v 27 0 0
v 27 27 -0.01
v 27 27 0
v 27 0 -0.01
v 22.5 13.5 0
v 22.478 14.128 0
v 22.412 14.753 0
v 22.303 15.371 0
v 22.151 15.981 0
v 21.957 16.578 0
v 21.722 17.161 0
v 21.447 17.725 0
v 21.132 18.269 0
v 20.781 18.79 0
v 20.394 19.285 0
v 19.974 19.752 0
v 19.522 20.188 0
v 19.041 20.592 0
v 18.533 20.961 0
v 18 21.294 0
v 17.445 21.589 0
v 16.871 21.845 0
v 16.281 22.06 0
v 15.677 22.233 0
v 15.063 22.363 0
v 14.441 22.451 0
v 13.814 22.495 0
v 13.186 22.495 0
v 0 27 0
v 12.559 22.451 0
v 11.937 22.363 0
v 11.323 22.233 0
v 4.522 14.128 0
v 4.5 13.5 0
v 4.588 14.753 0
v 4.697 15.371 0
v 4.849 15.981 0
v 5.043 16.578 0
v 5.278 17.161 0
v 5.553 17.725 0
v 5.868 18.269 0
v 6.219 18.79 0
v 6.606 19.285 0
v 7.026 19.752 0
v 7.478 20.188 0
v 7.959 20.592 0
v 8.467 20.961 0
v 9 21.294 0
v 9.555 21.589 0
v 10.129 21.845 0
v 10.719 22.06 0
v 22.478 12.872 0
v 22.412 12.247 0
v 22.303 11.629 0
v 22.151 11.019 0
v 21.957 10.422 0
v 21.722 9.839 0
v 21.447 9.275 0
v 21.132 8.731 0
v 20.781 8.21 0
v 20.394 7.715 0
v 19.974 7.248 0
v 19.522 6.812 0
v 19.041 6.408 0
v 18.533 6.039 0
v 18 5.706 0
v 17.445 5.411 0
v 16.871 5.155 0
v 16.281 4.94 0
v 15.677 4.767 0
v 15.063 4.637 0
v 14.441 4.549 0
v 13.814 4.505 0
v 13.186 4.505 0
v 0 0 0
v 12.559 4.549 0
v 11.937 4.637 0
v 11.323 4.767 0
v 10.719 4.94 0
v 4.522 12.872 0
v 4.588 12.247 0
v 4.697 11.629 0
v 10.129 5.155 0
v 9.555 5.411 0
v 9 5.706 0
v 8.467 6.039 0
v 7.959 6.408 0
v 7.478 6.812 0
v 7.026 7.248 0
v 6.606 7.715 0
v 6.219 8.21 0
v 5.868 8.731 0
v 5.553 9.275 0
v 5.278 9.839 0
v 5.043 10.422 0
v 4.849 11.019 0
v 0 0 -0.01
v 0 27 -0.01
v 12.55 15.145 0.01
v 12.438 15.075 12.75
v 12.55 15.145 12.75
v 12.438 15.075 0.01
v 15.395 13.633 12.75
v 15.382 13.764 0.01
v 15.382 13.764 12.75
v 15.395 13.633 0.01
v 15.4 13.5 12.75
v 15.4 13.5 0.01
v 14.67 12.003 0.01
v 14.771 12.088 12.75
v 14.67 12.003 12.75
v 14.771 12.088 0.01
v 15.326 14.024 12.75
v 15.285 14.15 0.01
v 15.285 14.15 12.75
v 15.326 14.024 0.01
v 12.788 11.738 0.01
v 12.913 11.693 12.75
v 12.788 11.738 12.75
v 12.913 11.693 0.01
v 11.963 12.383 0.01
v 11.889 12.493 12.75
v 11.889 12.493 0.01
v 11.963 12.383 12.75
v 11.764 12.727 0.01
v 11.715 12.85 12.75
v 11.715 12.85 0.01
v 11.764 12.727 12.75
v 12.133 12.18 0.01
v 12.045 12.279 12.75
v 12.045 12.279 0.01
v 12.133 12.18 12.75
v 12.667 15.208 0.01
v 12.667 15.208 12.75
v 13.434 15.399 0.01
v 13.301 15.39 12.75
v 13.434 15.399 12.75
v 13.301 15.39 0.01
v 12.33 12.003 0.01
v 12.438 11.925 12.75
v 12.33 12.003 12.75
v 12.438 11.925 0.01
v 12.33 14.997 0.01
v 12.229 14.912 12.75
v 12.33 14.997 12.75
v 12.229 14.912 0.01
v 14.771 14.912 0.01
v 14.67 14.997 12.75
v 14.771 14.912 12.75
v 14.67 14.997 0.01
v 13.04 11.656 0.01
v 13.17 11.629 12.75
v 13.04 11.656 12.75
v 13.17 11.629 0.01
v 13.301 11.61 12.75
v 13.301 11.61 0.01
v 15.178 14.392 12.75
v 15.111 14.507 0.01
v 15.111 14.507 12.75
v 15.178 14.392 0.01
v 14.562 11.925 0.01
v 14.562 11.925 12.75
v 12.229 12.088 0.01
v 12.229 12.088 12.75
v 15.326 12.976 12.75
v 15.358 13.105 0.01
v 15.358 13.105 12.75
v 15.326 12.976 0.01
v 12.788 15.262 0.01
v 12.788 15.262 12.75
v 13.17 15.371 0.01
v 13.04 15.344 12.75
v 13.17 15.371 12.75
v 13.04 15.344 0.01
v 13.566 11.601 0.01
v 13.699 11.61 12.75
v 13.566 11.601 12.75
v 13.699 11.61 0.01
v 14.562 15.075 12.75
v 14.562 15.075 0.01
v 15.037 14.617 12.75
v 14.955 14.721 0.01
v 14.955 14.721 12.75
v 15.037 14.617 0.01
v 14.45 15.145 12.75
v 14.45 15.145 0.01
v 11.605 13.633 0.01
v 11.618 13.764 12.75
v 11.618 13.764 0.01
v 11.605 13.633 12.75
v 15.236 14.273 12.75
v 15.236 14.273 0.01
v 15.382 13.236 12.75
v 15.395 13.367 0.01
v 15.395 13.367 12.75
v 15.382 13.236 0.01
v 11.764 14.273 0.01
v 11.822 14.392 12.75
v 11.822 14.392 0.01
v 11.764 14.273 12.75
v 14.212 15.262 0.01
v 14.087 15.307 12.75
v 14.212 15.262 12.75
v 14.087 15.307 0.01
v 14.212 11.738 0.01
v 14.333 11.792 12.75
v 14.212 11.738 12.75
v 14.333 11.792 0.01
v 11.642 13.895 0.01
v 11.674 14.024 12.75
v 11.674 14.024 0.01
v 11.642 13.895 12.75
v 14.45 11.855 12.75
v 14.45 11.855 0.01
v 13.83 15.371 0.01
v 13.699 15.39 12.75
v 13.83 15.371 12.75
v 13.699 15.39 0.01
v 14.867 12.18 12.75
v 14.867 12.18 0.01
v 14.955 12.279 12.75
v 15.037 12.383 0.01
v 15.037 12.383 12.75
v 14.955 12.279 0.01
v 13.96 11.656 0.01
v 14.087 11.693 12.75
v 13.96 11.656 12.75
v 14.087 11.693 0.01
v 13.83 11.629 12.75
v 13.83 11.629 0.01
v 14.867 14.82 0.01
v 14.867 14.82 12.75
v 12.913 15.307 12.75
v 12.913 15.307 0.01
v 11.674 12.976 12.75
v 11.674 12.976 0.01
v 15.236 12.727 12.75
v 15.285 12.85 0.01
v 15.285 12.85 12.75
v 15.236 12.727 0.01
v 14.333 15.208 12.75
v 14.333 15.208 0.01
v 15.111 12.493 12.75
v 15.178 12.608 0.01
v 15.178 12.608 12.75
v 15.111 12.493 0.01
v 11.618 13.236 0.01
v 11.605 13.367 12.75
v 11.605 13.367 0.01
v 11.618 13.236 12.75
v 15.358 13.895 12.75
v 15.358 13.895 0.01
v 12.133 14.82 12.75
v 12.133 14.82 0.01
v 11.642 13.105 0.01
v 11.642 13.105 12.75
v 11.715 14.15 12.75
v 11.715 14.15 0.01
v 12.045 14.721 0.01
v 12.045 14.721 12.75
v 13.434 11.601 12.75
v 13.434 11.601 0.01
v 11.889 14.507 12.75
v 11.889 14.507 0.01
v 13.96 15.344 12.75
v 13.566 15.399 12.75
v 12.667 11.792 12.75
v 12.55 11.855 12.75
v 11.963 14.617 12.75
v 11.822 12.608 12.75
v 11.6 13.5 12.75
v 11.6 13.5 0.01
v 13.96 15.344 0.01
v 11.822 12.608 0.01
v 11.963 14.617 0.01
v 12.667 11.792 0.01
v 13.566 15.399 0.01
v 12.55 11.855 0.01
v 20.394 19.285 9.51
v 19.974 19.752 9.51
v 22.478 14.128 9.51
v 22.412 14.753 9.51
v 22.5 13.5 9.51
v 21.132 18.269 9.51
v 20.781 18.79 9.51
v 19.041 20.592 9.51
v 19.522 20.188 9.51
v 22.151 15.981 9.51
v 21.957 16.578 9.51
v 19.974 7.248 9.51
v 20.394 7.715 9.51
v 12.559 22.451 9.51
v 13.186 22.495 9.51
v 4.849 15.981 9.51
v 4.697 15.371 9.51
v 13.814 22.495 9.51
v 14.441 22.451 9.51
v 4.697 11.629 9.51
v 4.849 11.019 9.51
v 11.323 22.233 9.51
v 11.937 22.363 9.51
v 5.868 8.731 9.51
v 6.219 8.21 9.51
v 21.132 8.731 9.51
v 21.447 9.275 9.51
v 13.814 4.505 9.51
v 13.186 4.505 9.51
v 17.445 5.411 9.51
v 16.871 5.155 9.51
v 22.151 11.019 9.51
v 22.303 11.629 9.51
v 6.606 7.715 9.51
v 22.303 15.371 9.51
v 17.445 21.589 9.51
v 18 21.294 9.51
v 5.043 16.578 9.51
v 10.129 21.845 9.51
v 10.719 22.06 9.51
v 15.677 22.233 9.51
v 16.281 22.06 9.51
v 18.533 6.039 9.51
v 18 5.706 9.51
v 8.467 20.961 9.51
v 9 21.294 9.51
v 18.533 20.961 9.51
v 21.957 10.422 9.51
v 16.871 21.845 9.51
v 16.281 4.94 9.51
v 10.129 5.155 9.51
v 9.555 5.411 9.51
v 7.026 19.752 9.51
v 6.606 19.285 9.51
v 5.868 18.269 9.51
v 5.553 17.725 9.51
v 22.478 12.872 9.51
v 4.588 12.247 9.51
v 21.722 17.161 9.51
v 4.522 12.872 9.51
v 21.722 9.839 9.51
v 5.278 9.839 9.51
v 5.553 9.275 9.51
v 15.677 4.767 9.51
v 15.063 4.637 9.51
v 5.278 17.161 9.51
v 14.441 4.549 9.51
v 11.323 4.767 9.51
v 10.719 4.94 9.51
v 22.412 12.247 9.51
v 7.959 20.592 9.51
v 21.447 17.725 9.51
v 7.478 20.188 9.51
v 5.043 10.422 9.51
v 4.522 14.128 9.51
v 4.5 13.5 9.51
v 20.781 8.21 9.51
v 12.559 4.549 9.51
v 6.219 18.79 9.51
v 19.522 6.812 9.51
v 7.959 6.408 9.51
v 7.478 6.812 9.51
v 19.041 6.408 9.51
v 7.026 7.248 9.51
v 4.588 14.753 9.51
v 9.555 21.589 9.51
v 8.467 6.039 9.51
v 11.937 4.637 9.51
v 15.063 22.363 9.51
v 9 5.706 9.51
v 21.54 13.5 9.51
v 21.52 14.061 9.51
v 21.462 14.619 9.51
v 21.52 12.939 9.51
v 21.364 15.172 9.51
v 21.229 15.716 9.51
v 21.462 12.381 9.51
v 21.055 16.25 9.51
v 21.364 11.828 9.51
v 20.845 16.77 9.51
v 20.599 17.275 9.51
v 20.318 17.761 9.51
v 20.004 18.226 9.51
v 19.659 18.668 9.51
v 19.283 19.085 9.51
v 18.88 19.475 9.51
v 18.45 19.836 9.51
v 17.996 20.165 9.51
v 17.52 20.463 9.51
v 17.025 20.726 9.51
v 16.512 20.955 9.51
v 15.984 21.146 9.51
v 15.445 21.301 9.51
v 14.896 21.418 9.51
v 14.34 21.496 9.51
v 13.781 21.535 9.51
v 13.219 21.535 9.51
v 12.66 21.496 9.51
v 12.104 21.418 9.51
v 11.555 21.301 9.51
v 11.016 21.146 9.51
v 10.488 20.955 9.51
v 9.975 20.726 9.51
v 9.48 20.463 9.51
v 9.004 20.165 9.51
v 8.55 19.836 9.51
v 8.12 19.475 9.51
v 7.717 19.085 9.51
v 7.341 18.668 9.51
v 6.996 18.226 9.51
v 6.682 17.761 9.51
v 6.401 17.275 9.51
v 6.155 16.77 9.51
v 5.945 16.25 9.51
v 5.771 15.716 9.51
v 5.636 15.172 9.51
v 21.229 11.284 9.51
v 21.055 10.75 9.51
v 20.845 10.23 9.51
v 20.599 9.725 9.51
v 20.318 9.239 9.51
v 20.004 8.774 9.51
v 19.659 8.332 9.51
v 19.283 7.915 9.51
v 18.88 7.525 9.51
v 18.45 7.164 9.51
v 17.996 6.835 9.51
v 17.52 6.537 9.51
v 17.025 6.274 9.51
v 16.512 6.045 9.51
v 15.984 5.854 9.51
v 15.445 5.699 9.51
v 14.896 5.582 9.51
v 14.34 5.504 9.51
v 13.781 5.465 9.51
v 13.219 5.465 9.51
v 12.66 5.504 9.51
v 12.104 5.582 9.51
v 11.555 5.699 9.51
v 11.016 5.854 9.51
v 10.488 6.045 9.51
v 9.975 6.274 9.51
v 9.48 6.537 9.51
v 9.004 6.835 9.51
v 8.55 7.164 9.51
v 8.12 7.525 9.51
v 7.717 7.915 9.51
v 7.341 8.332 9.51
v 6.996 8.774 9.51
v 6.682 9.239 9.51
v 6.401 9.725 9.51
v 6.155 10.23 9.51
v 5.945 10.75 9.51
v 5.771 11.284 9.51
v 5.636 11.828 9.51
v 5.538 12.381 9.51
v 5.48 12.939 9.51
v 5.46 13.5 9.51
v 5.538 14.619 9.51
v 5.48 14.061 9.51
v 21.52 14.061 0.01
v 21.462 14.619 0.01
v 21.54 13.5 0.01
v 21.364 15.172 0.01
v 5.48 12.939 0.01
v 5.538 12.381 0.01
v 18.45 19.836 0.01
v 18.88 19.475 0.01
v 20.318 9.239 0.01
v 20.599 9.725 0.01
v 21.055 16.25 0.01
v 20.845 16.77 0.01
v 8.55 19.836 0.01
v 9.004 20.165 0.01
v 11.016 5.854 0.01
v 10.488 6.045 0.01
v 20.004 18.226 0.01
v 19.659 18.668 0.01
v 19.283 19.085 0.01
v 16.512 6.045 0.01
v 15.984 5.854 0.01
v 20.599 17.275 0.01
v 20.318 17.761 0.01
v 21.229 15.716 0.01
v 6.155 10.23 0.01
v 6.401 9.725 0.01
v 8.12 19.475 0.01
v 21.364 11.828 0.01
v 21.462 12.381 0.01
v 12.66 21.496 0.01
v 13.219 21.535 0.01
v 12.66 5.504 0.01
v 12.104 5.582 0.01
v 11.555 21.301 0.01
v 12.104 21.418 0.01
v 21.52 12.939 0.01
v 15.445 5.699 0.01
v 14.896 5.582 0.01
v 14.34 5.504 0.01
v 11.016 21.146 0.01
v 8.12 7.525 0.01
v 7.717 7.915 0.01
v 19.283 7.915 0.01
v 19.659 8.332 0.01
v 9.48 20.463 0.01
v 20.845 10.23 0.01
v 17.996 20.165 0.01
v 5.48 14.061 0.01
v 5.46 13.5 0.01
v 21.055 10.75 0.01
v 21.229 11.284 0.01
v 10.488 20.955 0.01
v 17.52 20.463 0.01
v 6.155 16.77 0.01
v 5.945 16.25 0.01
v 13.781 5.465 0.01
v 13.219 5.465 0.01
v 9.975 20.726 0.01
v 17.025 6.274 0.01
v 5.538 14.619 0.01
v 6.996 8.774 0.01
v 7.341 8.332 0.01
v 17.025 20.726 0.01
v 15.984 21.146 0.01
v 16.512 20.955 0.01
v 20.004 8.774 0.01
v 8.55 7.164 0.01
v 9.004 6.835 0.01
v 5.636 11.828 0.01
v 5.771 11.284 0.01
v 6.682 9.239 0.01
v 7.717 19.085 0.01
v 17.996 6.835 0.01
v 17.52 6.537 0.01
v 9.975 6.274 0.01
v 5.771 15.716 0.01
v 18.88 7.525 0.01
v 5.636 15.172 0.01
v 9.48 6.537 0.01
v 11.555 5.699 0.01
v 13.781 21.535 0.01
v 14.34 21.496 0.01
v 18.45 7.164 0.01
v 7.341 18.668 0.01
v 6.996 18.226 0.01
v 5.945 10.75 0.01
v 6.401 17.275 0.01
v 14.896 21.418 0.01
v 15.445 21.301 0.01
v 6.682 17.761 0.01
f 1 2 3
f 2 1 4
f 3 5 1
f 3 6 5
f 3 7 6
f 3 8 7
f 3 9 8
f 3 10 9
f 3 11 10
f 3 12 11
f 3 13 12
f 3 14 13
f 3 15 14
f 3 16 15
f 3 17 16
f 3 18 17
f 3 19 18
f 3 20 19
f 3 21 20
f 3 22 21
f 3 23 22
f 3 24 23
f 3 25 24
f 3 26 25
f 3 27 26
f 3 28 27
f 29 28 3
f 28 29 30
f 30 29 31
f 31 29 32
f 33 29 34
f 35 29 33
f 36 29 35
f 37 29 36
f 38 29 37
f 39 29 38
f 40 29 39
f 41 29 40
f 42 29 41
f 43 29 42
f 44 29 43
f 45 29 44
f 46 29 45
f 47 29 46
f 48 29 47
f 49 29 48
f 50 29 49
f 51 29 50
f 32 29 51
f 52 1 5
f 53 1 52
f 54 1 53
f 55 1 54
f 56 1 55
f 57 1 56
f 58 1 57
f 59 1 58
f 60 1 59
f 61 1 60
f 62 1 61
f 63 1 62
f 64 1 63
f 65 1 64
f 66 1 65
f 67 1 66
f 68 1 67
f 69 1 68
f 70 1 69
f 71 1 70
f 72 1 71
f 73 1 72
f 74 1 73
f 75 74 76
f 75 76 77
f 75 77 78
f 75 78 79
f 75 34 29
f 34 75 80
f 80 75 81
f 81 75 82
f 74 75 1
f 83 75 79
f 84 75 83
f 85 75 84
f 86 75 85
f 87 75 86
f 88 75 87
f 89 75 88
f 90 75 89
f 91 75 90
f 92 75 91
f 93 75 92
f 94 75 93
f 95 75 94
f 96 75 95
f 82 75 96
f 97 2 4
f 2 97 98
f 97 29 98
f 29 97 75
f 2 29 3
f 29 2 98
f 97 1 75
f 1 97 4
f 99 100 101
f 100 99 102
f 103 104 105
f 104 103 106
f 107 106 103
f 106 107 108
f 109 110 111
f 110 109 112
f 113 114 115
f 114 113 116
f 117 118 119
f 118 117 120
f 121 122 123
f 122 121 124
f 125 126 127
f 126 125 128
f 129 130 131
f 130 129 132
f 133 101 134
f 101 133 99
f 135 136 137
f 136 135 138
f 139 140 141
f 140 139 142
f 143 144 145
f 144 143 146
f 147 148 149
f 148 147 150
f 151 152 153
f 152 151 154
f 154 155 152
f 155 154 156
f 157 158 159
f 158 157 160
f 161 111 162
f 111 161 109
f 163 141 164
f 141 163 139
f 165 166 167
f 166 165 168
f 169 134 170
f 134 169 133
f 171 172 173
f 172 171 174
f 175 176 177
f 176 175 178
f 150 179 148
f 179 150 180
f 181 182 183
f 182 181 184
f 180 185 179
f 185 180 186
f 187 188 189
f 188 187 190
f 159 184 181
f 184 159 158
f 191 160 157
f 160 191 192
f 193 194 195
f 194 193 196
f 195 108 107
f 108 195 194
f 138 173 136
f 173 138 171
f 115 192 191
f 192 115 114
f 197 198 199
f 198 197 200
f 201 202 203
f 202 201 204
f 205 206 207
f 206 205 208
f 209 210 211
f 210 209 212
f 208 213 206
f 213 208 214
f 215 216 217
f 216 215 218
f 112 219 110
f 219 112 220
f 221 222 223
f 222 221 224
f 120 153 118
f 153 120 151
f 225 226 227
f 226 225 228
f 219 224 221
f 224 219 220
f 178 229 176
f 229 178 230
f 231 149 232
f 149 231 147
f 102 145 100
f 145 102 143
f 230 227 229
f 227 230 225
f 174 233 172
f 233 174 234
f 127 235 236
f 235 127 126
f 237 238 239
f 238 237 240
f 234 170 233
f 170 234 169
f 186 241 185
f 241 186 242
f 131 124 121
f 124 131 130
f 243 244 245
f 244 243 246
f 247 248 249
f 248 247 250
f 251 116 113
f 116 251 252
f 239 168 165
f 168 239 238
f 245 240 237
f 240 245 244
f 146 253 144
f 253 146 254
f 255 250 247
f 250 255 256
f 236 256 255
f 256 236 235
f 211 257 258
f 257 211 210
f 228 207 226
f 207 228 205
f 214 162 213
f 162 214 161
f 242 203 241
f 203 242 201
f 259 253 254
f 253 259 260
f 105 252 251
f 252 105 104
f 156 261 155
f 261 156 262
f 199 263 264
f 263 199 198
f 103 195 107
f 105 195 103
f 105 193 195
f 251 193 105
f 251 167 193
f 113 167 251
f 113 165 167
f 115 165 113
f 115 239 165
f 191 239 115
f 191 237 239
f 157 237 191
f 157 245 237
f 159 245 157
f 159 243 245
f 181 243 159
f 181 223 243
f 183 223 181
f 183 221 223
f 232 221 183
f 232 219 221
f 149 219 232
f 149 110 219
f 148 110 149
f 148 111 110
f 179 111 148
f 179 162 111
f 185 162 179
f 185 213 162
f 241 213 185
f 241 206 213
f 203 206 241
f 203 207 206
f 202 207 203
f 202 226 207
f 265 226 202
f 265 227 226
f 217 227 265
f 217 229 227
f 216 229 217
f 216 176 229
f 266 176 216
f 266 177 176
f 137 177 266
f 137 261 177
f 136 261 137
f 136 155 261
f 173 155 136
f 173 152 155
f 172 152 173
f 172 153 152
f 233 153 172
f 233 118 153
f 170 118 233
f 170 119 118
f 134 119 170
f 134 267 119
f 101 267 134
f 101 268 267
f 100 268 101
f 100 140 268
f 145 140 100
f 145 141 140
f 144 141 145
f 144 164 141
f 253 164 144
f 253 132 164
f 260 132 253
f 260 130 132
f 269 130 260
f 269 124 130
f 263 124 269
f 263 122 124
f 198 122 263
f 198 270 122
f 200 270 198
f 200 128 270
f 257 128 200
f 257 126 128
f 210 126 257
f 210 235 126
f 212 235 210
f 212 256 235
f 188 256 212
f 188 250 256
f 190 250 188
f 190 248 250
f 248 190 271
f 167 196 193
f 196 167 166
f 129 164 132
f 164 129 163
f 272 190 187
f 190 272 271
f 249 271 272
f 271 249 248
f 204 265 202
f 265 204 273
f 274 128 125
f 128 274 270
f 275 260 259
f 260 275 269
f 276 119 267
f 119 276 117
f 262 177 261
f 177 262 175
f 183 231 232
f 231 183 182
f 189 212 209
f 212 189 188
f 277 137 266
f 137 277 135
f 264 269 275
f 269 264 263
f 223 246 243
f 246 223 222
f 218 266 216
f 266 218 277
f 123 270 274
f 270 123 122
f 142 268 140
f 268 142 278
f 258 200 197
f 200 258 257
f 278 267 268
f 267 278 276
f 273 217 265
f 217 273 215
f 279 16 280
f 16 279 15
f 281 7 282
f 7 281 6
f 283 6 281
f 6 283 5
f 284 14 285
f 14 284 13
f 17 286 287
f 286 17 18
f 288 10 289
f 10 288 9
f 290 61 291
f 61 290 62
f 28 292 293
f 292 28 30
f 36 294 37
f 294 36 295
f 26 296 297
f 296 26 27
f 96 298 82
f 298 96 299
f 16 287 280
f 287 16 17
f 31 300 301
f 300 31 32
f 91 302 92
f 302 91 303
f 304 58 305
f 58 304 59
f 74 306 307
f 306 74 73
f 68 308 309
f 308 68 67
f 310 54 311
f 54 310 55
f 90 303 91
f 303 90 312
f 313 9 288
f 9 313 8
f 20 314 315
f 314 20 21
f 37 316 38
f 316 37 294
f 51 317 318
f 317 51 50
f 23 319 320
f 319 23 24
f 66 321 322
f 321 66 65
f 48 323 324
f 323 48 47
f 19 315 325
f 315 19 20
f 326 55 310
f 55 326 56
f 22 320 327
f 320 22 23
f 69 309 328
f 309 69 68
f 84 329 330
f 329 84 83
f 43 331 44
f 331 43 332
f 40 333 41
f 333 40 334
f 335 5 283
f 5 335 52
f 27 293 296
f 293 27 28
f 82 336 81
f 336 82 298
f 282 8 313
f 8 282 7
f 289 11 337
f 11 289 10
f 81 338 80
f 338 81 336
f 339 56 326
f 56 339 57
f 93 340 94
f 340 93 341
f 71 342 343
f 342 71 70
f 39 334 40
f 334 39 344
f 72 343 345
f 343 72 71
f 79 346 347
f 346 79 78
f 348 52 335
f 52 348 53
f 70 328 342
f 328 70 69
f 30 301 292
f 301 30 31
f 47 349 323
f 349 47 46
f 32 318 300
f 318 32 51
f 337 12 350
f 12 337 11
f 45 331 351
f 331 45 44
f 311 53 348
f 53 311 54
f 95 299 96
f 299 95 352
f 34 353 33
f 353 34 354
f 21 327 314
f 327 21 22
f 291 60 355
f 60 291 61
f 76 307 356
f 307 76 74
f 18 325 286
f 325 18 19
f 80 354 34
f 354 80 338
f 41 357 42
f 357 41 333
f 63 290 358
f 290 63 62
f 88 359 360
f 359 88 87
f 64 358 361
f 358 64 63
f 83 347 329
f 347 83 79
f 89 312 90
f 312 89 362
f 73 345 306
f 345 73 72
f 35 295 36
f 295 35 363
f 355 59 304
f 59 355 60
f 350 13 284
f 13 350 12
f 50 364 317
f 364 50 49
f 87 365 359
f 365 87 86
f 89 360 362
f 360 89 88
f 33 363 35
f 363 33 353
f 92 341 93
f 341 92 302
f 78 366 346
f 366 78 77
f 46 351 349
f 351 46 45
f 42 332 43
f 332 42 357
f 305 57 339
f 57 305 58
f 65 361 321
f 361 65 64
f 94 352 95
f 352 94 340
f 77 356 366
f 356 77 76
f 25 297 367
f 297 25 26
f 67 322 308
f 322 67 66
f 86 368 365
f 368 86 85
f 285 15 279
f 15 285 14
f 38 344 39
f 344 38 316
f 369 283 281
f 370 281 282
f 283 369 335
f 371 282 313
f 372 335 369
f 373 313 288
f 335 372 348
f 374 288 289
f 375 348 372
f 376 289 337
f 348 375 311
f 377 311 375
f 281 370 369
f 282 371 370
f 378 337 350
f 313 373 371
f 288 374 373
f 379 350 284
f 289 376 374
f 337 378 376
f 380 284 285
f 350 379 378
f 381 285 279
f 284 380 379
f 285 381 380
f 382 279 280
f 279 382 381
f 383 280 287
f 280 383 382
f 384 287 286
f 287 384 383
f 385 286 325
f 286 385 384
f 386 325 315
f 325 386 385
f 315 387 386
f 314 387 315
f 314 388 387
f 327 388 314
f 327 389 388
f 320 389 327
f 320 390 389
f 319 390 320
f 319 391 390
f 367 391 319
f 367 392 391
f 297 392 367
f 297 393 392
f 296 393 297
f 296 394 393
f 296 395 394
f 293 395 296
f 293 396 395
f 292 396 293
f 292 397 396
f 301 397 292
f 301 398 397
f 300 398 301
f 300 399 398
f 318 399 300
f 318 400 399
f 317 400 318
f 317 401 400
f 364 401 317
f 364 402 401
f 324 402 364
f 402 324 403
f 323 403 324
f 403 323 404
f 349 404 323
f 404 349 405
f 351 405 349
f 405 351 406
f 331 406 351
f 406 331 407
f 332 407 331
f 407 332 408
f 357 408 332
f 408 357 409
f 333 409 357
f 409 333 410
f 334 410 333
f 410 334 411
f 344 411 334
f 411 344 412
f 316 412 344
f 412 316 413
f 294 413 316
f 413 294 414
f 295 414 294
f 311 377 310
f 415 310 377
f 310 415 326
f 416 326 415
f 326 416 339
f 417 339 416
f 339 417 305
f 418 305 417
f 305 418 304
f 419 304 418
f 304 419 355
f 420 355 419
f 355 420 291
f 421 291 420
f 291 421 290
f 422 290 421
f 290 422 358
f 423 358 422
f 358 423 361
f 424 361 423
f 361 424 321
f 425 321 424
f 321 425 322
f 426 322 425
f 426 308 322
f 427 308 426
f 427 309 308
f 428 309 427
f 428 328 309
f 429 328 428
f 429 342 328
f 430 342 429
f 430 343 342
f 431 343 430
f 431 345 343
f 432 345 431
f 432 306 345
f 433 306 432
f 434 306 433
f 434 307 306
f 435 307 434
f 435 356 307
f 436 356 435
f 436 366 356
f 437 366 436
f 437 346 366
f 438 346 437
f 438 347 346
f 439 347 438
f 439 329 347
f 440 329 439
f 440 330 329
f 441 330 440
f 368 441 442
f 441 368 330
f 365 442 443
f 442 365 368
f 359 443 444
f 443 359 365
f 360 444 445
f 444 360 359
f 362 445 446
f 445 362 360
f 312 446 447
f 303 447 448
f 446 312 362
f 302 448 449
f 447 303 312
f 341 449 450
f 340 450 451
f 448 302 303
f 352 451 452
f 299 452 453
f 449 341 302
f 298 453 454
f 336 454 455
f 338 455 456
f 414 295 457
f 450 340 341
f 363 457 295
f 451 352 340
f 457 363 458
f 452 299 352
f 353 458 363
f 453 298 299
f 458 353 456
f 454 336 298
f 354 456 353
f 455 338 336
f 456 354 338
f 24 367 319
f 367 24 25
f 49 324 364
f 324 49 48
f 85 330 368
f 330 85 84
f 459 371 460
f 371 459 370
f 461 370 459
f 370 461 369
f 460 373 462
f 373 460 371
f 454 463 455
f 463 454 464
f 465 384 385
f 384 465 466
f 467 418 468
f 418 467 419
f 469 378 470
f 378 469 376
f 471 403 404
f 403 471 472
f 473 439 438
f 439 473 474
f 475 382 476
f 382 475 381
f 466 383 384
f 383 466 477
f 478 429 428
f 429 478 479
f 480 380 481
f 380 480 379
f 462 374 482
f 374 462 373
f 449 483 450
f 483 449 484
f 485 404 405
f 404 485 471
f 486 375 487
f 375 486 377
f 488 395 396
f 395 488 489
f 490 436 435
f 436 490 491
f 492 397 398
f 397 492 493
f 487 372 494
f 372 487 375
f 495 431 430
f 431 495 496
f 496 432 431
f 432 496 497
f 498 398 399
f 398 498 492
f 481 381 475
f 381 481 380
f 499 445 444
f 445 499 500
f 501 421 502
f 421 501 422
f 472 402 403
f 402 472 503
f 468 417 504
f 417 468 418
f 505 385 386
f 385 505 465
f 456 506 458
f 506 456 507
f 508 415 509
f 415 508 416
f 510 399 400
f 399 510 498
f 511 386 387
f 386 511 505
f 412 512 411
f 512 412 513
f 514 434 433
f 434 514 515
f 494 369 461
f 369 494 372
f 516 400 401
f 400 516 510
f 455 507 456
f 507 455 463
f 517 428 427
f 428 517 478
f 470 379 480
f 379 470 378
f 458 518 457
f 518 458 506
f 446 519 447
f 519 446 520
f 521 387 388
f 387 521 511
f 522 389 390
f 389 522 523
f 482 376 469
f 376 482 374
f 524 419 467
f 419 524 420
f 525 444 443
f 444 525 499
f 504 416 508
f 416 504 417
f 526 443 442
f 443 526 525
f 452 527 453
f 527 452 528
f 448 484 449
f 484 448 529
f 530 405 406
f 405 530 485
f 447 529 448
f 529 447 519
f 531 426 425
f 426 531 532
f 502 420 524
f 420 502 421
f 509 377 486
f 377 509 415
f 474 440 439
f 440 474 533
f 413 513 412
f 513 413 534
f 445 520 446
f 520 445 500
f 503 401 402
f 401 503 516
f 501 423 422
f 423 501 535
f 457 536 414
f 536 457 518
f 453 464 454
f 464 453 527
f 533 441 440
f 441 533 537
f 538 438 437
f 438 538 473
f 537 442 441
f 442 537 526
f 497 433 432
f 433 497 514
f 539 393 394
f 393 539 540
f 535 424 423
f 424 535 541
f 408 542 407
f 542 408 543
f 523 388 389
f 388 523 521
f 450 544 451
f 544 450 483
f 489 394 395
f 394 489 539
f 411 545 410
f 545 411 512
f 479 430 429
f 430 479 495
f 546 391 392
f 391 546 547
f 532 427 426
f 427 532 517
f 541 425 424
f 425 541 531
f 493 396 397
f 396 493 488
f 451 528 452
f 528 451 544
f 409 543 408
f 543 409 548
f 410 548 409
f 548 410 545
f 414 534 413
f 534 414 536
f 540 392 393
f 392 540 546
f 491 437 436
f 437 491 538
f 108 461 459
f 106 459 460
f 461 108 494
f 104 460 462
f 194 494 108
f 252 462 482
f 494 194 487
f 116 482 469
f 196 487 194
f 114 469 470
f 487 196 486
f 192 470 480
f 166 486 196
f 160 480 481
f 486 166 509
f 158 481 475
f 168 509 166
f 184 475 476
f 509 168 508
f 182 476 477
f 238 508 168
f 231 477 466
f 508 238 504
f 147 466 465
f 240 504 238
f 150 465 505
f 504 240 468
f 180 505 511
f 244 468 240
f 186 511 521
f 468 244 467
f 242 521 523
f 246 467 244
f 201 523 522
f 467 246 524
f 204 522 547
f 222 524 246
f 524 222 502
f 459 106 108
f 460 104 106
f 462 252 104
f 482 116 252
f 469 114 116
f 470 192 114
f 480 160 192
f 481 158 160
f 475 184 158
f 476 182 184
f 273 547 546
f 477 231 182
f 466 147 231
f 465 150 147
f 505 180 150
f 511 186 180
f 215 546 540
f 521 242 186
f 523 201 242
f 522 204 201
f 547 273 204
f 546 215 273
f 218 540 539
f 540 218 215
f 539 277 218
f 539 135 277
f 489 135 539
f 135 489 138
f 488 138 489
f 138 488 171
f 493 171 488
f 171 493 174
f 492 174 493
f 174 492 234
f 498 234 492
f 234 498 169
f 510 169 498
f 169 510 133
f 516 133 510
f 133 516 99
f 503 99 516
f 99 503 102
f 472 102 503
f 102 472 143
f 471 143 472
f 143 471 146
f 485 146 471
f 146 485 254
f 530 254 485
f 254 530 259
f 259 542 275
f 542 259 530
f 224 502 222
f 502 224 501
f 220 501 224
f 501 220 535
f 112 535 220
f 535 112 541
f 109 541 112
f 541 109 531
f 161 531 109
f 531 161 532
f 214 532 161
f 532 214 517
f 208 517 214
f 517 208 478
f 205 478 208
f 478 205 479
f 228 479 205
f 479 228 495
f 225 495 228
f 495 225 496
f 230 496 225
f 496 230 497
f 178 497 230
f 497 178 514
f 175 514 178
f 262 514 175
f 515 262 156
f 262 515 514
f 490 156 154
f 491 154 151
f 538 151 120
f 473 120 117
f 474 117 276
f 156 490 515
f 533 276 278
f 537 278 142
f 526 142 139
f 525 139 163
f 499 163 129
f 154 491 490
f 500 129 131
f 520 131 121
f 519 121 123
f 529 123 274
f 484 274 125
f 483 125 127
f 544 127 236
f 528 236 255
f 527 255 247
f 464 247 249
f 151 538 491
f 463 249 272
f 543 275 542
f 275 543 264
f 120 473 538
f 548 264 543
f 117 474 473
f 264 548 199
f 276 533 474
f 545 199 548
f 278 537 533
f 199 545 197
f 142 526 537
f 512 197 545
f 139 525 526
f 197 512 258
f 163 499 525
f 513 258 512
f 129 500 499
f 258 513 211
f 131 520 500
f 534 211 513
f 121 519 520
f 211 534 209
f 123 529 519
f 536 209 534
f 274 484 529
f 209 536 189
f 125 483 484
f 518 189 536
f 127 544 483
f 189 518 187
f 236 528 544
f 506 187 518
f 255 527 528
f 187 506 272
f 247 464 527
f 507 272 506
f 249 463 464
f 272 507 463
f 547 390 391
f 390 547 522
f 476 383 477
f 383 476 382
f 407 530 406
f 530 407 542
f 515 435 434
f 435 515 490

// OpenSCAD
// file: ../Base/PlacementOptions.scad
// Fischertechnik Box Foundation
// Placement Options

// Alignment
NoAlign = 0;
AlignLeft = 1;
AlignBottom = 2;
AlignCenter = 3;
AlignRight = 4;
AlignTop = 5;

// Element rotation degree steps
rotations = [0, -90, -180, -270];

// Rotation
NoRotation = 0;
Rotate0 = 0;
Rotate90 = 1;
Rotate180 = 2;
Rotate270 = 3;

// Docking (seen from above)
NoDock = -1;
DockLeft = 0;
DockTop = 1;
DockRight = 2;
DockCorner = 2;
DockBottom = 3;

// Web corners
LowerLeft = 0;
UpperLeft = 1;
UpperRight = 2;
LowerRight = 3;

// Web position relative to corner
LeftOfCorner = 0;
RightOfCorner = 1;
// file: ../Base/Boxes.scad
// Fischertechnik Box Foundation
// Pre-designed Boxes

use <Constants.scad>

include <PlacementOptions.scad>

box190Width = 190;
box190Depth = 130;
box130Width = 130;
box130Depth = 95;

// Values are from an original ec3 box
topBottomDifference = 1.5;
outerHeight = 40;
baseThickness = 1.8;
innerHeight = outerHeight - baseThickness;
stackExcess = 5.7;
radius = 3.5;
wallThickness = 1.5;
tolerance = 0.2;

boxWallThickness = wallThickness;
boxBaseThickness = baseThickness;
boxWebWidth = 3.0;

// getBoxWallThickness()
// Gets the wall thickness of a Fischertechnik Box
function getBoxWallThickness() = boxWallThickness;

// getBoxUsageHeight(height = 38.2)
// Gets the usable height of a Fischertechnik box
// height = Outer height of the box from the bottom to the upper edge.
function getBoxUsageHeight(height = outerHeight) = height - baseThickness - stackExcess;

// getBoxInnerHeight()
// Gets the inner height of a Fischertechnik box, including the stack excess
function getBoxInnerHeight() = innerHeight;

// getBoxBaseThickness()
// Gets the thickness of the Fischertechnik box base.
function getBoxBaseThickness() = boxBaseThickness;

// getBoxWebWidth()
// Gets the width of a box web
function getBoxWebWidth() = boxWebWidth;

// getBox190Space()
// Gets the usable inner space of a Box 190 as an x/y-list
function getBox190Space() = [
    box190Width - 2*getBoxWallThickness() - topBottomDifference, 
    box190Depth - 2*getBoxWallThickness() - topBottomDifference ];

// RoundedCornerPlate(width, depth, height, radius)
// Creates a body plate with rounded corners for a box. Used
// also to create the complete box with the hull module.
// width = Width of the plate
// depth = depth of the plate 
// height = thickness of the plate
// radius = radius of the rounded corner
module RoundedCornerPlate(width, depth, height, radius) {
    translate([radius, radius])
    hull() {
        w = width-2*radius;
        d = depth-2*radius;
        cube([w, d, height]);
        cylinder(height, r=radius, $fn=getFragments());
        translate([w, 0])
            cylinder(height, r=radius, $fn=getFragments());
        translate([w, d])
            cylinder(height, r=radius, $fn=getFragments());
        translate([0, d])
            cylinder(height, r=radius, $fn=getFragments());
    }
}

// BoxBase(width, depth)
// Creates an empty stackable Fischertechnik compatible box
// width = Outer width of the box (190, 130, ...)
// depth = Outer depth of the box (130, 95, ...)

module BoxBase(width, depth, height=outerHeight) {    
    thinPlate = 0.01;

    innerHeight = height - baseThickness;    
    
    module Body(tolerance=tolerance) {
        hull() {
            // Bottom with tolerance to fit into the original boxes when stacked
            translate([-wallThickness+tolerance, -wallThickness+tolerance, -baseThickness])
                RoundedCornerPlate(width-topBottomDifference-2*tolerance, depth-topBottomDifference-2*tolerance, thinPlate, radius);
            
            // Top
            translate([-wallThickness-topBottomDifference/2, -wallThickness-topBottomDifference/2, innerHeight-thinPlate])
                RoundedCornerPlate(width, depth, thinPlate, radius);
         }
    }

    module Cutoff() {
        hull() {
            coWidth = width - 2*wallThickness;
            coDepth = depth - 2*wallThickness;
            
            // Bottom
            RoundedCornerPlate(coWidth-topBottomDifference, coDepth-topBottomDifference, thinPlate, radius);

            // Top
            translate([-topBottomDifference/2, -topBottomDifference/2, innerHeight+thinPlate]) 
                RoundedCornerPlate(coWidth, coDepth, thinPlate, radius);
        }
    }
    
    difference() {        
        Body();
        Cutoff();
        stackOffset = innerHeight - stackExcess;
        translate([0, 0, stackOffset + baseThickness])
            Body(tolerance=0);
    }
}

// Creates the Fischertechnik empty box 130x190 mm and places it at position 0,0
// 190x130 are the outer sizes, the inner space is slightly smaller. Use getBox190Space() to get the inner sizes.
// The box is positioned that the usable inner space is at the 0,0,0 position.

module Box190() {
    BoxBase(box190Width, box190Depth);
}

// Gets the usable inner space of a Box 130 as an x/y-list
function getBox130Space() = [
    box130Width - 2*getBoxWallThickness() - topBottomDifference, 
    box130Depth - 2*getBoxWallThickness() - topBottomDifference ];

// Creates the Fischertechnik empty box 95x130 mm and places it at position 0,0
// 190x130 are the outer sizes, the inner space is slightly smaller. Use getBox190Space() to get the inner sizes.
// The box is positioned that the usable inner space is at the 0,0,0 position.

module Box130() {
    BoxBase(box130Width, box130Depth);
}

// Creates a web at the specified box walls
// corner 0 = LowerLeft, 1 = UpperLeft, 2 = UpperRight, 3 = LowerRight
// side 0 = LeftOfCorner, 1 = RightOfCorner
// distance = Distance in mm from the corner
// boxSpace = inner width and depth of the box (default: Box 190)
// webWidth = length of the web (default is 3 mms)
// webThickness = thickness of the web (default is 1 mm)
// height = Height of the web (standard is getBoxUsageHeight())

module BoxWeb(corner, side, distance, boxSpace=getBox190Space(), webWidth=getBoxWebWidth(), webThickness=1.0, height=getBoxUsageHeight()) {
    sink = getBoxWallThickness()/2;

    width = (corner % 2 == 0) ? 
            (side == LeftOfCorner ? webWidth : webThickness) :
            (side == LeftOfCorner ? webThickness : webWidth);

    depth = (corner % 2 == 0) ? 
            (side == RightOfCorner ? webWidth : webThickness) :
            (side == RightOfCorner ? webThickness : webWidth);
    
    xDiff = corner == LowerLeft ? 
                (side == LeftOfCorner ? -sink : distance) :
            (corner == UpperLeft ?                
                (side == LeftOfCorner ? distance : -sink) :
            (corner == UpperRight ?
                (side == LeftOfCorner ? boxSpace.x-webWidth+sink : boxSpace.x-distance-webThickness) :
                (side == LeftOfCorner ? boxSpace.x-distance-webThickness: boxSpace.x-webWidth+sink)));

    yDiff = corner == LowerLeft ? 
                (side == RightOfCorner ? -sink : distance) :
            (corner == UpperLeft ?
                (side == RightOfCorner ? boxSpace.y-distance-webThickness : boxSpace.y-webWidth+sink) :
            (corner == UpperRight ?
                (side == RightOfCorner ? boxSpace.y-webWidth+sink : boxSpace.y-distance-webThickness) :
                (side == RightOfCorner ? distance : -sink)));
    
    translate([xDiff, yDiff, -getExcess()])
        cube([width, depth, height + 2*getExcess()]);
}
// file: ../Base/Rotation.scad
// Fischertechnik Box Foundation
// Geometry Helpers Rotation

include <PlacementOptions.scad>

// getRotatedSpace(space, rotation=NoRotation)
// Rotates the space dependent on the specified rotation

function getRotatedSpace(space, rotation=NoRotation) = [
    (rotation == Rotate90 || rotation == Rotate270) ? space.y : space.x,
    (rotation == Rotate90 || rotation == Rotate270) ? space.x : space.y
];

// Rotates the given space around the fixed left lower corner
// space = the space the children needs as width/depth list [width,depth]
// rotation = 0 Rotate0 degrees, 1 Rotate90 degrees, 2 Rotate180 degrees, 3 Rotate270 degrees (equivalent to -90)

module RotateFix(space, rotation=NoRotation) {
    dy = (rotation == Rotate0 || rotation == Rotate270) ? 0 :
        (rotation == Rotate90) ? space.x :
        space.y;
    dx = (rotation < Rotate180) ? 0 :
        (rotation == Rotate180) ? space.x :
        space.y;
    
    translate([dx, dy, 0])
        rotate([0, 0, rotations[rotation]])
            children();
}
// file: ../Base/Alignment.scad
// Fischertechnik Box Foundation
// Geometry Helpers Alignment

include <PlacementOptions.scad>

// getAlignedX(elementWidth, spaceWidth, align=AlignRight, offset=0)
// Gets the aligned X offset of an element with the given
// width in the given space.
// elementWidth = The width of the element to positon
// spaceWidth = The space where the element should be aligned
// align = 0 AlignLeft, 1 AlignCenter, 2 AlignRight
// offset = an optional offset from the aligned position. When
// aligned left or centered, then positive values are in X direction.
// When aligned right then positive values are in negative X direction.

function getAlignedX(elementWidth, spaceWidth, align=AlignRight, offset=0) =
    (align == AlignLeft) ?
        offset :
        ((align == AlignCenter) ?
        (spaceWidth - elementWidth)/2 + offset :
        spaceWidth - offset - elementWidth);

// getAlignedY(elementDepth, spaceDepth, align=AlignTop, offset=0)
// Gets the aligned Y offset of an element with the given
// depth in the given space.
// elementDepth = The depth of the element to positon
// spaceDepth = The space where the element should be aligned
// align = 0 AlignBottom, 1 AlignCenter, 2 AlignTop
// offset = an optional offset from the aligned position. When
// aligned bottom or centered, then positive values are in Y direction.
// When aligned top then positive values are in negative Y direction.

function getAlignedY(elementDepth, spaceDepth, align=AlignTop, offset=0) =
    (align == AlignBottom) ?
        offset :
        ((align == AlignCenter) ?
        (spaceDepth - elementDepth)/2 + offset :
        spaceDepth - offset - elementDepth);
// file: ../Base/Constants.scad
// Fischertechnik Box Foundation
// Constants

// Constant values necessary for multiple elements

// Base constants
dividerThickness = 1.2;
excess = 0.01;
fragments = 90;
tolerance = 0.8;

// Gets the thickness of a divider 
function getDividerThickness() = dividerThickness;

// Gets the excess that is used to merge walls into each other
function getExcess() = excess;

// Gets amount of fragments of a cylinder
function getFragments() = fragments;

// Gets the inner tolerance of a frame to each side
function getTolerance() = tolerance;


// Fischertechnik specific constants
axisDiameter = 4;
axisBottomDiameter = axisDiameter + 1;
axisTolerance = 0.2;

// Gets axis diameter of Fischertechnik axis
function getAxisDiameter() = axisDiameter;

// Gets axis diameter tolerance (subtracted for element axis)
function getAxisTolerance() = axisTolerance;

// Gets the axis diameter for standing axis
function getStandAxisDiameter() = getAxisDiameter() - getAxisTolerance();

// Gets axis bottom diameter for thicker part at the bottom
function getAxisBottomDiameter() = axisBottomDiameter;

pinHeight = 2.5;

// gets the height of a connecting pin
function getPinHeight() = pinHeight;

standardEdgeDistance = 2.5;
standardWebDistance = 11.5;
standardCornerLength = 15;

// gets the standard distance to the wall of the box for dockable frames with webs
function getStandardEdgeDistance() = standardEdgeDistance;

// gets the standard distance of each web to the corner of the dockable frame
function getStandardWebDistance() = standardWebDistance;

// gets the standard length of the corner walls of a dockable frame
function getStandardCornerLength() = standardCornerLength;

tubeWallFactor = 0.8;

// gets the wall thickness of a tube.
function getTubeWallThickness() = tubeWallFactor * getDividerThickness();

smallPartsFrameHeight = 20;

// gets the frame height for docked small parts boxes.
function getSmallPartsFrameHeight() = smallPartsFrameHeight;

hubRingDiameter = 19.5;
hubRingLevelDiameter = 21;

// gets the diameter of a tube matching the inner ring of a wheel
function getHubRingDiameter() = hubRingDiameter;

// gets the diameter of a hub tube with a thicker diameter
function getHubRingLevelDiameter() = hubRingLevelDiameter;
// file: ../Base/Placement.scad
// Fischertechnik Box Foundation
// Geometry Helpers Placement

use <Constants.scad>
use <Alignment.scad>
use <Rotation.scad>
use <Boxes.scad>

include <PlacementOptions.scad>

// Place(x=0, y=0, elementSpace=[0,0], alignX=AlignLeft, alignY=AlignBottom, rotation=Rotate0, boxSpace=getBox190Space())
// Places the child at the specified position
// y = Y-Position. This is a relative position when an X aligment is specified.
// x = X-Position. This is a relative position when an Y aligment is specified.
// elementSpace = space of the element to be placed [x,y]
// alignX = -1=NoAlign, 0 AlignLeft, 1 AlignCenter, 3 AlignRight (elementSpace and boxSpace required!)
// alignY = -1=NoAlign, 2 AlignBottom, 1 AlignCenter, 4 AlignTop (elementSpace and boxSpace required!)
// rotation = 0 Rotate0 0 degrees, 1 Rotate90 90 degrees, 
// 2 Rotate180 180 degrees, 3 Rotate270 270 degrees (equivalent to -90)
// boxSpace = Inner space of the box where the placement occurs [x,y] - default is Box 190x130 inner space

module Place(x=0, y=0, elementSpace=[0,0], 
  alignX=AlignLeft, alignY=AlignBottom, 
  rotation=NoRotation, boxSpace=getBox190Space()) {

    module Position(x, y, space, rotation=Rotate0) {
        translate([x, y, 0])
            RotateFix(space, rotation)
                children();
    }

    space = getRotatedSpace(elementSpace, rotation);
    alignedX = getAlignedX(space.x, boxSpace.x, alignX, x);
    alignedY = getAlignedY(space.y, boxSpace.y, alignY, y);
    Position(alignedX, alignedY, elementSpace, rotation)
        children();
}

// Center(space=getBox130Space(), elementSpace=[0,0])
// space = Space where the children is centered. For cylinder use centered=true and no elementSpace.
// elementSpace = space of the element to be centered [x,y]

module Center(space=getBox190Space(), elementSpace=[0,0]) {
    Place(elementSpace=elementSpace, boxSpace=space, alignX=AlignCenter, alignY=AlignCenter)
        children();
}

// CenterHorizontal(width=0, y=0, offset=0, space=getBox130Space())
// width = Width of the element to be placed.
// y = Y position of the element
// offset = Offset from the center position (negative will be left of the center)
// space = Space where the element is placed

module CenterHorizontal(width=0, y=0, offset=0, space=getBox190Space()) {
    Place(x=offset, y=y, elementSpace=[width, 0], boxSpace=space, alignX=AlignCenter)
        children(0);
}

// CenterVertical(depth=0, x=0, offset=0, space=getBox130Space())
// depth = Depth of the element to be placed.
// x = X position of the element
// offset = Offset from the center position (negative will be down of the center)
// space = Space where the element is placed

module CenterVertical(depth=0, x=0, offset=0, space=getBox190Space()) {
    Place(x=x, y=offset, elementSpace=[0, depth], boxSpace=space, alignY=AlignCenter)
        children(0);
}

// getIsVertical(align)
// True if the specified alignment needs a vertical orientation for a divider (AlignRight, AlignLeft)

function getIsVertical(align) = (align == AlignRight || align == AlignLeft);

// getIsHorizontal(align)
// True if the specified alignment needs a horizontal orientation for a divider (AlignTop, AlignBottom)

function getIsHorizontal(align) = (align == AlignTop || align == AlignBottom);
// main file
// Fischertechnik Box Library
// Axis with cylinder for idler gear Z15
// 35695

use <../Base/Placement.scad>
use <../ModelBase/Simple.scad>

/* [Hidden] */
width = 27;
depth = 27;
height = 12.75;

// getAxisAndCylinderIdlerGearZ15Space()
// Gets the space of an axis for an idler gear Z15 (mot2)

function getAxisAndCylinderIdlerGearZ15Space() = [width, depth, height];

// AxisAndCylinderIdlerGearZ15()
// Axis for for an idler gear Z15 (mot2)

module AxisAndCylinderIdlerGearZ15() {
    AxisWithSpace(height, getAxisAndCylinderIdlerGearZ15Space());

    cylinderHeight = 9.5;
    diameter = 18;
    Center(getAxisAndCylinderIdlerGearZ15Space())
        Tube(cylinderHeight, outerDiameter=diameter);
}

// Tests
color("lightgray")
AxisAndCylinderIdlerGearZ15();
